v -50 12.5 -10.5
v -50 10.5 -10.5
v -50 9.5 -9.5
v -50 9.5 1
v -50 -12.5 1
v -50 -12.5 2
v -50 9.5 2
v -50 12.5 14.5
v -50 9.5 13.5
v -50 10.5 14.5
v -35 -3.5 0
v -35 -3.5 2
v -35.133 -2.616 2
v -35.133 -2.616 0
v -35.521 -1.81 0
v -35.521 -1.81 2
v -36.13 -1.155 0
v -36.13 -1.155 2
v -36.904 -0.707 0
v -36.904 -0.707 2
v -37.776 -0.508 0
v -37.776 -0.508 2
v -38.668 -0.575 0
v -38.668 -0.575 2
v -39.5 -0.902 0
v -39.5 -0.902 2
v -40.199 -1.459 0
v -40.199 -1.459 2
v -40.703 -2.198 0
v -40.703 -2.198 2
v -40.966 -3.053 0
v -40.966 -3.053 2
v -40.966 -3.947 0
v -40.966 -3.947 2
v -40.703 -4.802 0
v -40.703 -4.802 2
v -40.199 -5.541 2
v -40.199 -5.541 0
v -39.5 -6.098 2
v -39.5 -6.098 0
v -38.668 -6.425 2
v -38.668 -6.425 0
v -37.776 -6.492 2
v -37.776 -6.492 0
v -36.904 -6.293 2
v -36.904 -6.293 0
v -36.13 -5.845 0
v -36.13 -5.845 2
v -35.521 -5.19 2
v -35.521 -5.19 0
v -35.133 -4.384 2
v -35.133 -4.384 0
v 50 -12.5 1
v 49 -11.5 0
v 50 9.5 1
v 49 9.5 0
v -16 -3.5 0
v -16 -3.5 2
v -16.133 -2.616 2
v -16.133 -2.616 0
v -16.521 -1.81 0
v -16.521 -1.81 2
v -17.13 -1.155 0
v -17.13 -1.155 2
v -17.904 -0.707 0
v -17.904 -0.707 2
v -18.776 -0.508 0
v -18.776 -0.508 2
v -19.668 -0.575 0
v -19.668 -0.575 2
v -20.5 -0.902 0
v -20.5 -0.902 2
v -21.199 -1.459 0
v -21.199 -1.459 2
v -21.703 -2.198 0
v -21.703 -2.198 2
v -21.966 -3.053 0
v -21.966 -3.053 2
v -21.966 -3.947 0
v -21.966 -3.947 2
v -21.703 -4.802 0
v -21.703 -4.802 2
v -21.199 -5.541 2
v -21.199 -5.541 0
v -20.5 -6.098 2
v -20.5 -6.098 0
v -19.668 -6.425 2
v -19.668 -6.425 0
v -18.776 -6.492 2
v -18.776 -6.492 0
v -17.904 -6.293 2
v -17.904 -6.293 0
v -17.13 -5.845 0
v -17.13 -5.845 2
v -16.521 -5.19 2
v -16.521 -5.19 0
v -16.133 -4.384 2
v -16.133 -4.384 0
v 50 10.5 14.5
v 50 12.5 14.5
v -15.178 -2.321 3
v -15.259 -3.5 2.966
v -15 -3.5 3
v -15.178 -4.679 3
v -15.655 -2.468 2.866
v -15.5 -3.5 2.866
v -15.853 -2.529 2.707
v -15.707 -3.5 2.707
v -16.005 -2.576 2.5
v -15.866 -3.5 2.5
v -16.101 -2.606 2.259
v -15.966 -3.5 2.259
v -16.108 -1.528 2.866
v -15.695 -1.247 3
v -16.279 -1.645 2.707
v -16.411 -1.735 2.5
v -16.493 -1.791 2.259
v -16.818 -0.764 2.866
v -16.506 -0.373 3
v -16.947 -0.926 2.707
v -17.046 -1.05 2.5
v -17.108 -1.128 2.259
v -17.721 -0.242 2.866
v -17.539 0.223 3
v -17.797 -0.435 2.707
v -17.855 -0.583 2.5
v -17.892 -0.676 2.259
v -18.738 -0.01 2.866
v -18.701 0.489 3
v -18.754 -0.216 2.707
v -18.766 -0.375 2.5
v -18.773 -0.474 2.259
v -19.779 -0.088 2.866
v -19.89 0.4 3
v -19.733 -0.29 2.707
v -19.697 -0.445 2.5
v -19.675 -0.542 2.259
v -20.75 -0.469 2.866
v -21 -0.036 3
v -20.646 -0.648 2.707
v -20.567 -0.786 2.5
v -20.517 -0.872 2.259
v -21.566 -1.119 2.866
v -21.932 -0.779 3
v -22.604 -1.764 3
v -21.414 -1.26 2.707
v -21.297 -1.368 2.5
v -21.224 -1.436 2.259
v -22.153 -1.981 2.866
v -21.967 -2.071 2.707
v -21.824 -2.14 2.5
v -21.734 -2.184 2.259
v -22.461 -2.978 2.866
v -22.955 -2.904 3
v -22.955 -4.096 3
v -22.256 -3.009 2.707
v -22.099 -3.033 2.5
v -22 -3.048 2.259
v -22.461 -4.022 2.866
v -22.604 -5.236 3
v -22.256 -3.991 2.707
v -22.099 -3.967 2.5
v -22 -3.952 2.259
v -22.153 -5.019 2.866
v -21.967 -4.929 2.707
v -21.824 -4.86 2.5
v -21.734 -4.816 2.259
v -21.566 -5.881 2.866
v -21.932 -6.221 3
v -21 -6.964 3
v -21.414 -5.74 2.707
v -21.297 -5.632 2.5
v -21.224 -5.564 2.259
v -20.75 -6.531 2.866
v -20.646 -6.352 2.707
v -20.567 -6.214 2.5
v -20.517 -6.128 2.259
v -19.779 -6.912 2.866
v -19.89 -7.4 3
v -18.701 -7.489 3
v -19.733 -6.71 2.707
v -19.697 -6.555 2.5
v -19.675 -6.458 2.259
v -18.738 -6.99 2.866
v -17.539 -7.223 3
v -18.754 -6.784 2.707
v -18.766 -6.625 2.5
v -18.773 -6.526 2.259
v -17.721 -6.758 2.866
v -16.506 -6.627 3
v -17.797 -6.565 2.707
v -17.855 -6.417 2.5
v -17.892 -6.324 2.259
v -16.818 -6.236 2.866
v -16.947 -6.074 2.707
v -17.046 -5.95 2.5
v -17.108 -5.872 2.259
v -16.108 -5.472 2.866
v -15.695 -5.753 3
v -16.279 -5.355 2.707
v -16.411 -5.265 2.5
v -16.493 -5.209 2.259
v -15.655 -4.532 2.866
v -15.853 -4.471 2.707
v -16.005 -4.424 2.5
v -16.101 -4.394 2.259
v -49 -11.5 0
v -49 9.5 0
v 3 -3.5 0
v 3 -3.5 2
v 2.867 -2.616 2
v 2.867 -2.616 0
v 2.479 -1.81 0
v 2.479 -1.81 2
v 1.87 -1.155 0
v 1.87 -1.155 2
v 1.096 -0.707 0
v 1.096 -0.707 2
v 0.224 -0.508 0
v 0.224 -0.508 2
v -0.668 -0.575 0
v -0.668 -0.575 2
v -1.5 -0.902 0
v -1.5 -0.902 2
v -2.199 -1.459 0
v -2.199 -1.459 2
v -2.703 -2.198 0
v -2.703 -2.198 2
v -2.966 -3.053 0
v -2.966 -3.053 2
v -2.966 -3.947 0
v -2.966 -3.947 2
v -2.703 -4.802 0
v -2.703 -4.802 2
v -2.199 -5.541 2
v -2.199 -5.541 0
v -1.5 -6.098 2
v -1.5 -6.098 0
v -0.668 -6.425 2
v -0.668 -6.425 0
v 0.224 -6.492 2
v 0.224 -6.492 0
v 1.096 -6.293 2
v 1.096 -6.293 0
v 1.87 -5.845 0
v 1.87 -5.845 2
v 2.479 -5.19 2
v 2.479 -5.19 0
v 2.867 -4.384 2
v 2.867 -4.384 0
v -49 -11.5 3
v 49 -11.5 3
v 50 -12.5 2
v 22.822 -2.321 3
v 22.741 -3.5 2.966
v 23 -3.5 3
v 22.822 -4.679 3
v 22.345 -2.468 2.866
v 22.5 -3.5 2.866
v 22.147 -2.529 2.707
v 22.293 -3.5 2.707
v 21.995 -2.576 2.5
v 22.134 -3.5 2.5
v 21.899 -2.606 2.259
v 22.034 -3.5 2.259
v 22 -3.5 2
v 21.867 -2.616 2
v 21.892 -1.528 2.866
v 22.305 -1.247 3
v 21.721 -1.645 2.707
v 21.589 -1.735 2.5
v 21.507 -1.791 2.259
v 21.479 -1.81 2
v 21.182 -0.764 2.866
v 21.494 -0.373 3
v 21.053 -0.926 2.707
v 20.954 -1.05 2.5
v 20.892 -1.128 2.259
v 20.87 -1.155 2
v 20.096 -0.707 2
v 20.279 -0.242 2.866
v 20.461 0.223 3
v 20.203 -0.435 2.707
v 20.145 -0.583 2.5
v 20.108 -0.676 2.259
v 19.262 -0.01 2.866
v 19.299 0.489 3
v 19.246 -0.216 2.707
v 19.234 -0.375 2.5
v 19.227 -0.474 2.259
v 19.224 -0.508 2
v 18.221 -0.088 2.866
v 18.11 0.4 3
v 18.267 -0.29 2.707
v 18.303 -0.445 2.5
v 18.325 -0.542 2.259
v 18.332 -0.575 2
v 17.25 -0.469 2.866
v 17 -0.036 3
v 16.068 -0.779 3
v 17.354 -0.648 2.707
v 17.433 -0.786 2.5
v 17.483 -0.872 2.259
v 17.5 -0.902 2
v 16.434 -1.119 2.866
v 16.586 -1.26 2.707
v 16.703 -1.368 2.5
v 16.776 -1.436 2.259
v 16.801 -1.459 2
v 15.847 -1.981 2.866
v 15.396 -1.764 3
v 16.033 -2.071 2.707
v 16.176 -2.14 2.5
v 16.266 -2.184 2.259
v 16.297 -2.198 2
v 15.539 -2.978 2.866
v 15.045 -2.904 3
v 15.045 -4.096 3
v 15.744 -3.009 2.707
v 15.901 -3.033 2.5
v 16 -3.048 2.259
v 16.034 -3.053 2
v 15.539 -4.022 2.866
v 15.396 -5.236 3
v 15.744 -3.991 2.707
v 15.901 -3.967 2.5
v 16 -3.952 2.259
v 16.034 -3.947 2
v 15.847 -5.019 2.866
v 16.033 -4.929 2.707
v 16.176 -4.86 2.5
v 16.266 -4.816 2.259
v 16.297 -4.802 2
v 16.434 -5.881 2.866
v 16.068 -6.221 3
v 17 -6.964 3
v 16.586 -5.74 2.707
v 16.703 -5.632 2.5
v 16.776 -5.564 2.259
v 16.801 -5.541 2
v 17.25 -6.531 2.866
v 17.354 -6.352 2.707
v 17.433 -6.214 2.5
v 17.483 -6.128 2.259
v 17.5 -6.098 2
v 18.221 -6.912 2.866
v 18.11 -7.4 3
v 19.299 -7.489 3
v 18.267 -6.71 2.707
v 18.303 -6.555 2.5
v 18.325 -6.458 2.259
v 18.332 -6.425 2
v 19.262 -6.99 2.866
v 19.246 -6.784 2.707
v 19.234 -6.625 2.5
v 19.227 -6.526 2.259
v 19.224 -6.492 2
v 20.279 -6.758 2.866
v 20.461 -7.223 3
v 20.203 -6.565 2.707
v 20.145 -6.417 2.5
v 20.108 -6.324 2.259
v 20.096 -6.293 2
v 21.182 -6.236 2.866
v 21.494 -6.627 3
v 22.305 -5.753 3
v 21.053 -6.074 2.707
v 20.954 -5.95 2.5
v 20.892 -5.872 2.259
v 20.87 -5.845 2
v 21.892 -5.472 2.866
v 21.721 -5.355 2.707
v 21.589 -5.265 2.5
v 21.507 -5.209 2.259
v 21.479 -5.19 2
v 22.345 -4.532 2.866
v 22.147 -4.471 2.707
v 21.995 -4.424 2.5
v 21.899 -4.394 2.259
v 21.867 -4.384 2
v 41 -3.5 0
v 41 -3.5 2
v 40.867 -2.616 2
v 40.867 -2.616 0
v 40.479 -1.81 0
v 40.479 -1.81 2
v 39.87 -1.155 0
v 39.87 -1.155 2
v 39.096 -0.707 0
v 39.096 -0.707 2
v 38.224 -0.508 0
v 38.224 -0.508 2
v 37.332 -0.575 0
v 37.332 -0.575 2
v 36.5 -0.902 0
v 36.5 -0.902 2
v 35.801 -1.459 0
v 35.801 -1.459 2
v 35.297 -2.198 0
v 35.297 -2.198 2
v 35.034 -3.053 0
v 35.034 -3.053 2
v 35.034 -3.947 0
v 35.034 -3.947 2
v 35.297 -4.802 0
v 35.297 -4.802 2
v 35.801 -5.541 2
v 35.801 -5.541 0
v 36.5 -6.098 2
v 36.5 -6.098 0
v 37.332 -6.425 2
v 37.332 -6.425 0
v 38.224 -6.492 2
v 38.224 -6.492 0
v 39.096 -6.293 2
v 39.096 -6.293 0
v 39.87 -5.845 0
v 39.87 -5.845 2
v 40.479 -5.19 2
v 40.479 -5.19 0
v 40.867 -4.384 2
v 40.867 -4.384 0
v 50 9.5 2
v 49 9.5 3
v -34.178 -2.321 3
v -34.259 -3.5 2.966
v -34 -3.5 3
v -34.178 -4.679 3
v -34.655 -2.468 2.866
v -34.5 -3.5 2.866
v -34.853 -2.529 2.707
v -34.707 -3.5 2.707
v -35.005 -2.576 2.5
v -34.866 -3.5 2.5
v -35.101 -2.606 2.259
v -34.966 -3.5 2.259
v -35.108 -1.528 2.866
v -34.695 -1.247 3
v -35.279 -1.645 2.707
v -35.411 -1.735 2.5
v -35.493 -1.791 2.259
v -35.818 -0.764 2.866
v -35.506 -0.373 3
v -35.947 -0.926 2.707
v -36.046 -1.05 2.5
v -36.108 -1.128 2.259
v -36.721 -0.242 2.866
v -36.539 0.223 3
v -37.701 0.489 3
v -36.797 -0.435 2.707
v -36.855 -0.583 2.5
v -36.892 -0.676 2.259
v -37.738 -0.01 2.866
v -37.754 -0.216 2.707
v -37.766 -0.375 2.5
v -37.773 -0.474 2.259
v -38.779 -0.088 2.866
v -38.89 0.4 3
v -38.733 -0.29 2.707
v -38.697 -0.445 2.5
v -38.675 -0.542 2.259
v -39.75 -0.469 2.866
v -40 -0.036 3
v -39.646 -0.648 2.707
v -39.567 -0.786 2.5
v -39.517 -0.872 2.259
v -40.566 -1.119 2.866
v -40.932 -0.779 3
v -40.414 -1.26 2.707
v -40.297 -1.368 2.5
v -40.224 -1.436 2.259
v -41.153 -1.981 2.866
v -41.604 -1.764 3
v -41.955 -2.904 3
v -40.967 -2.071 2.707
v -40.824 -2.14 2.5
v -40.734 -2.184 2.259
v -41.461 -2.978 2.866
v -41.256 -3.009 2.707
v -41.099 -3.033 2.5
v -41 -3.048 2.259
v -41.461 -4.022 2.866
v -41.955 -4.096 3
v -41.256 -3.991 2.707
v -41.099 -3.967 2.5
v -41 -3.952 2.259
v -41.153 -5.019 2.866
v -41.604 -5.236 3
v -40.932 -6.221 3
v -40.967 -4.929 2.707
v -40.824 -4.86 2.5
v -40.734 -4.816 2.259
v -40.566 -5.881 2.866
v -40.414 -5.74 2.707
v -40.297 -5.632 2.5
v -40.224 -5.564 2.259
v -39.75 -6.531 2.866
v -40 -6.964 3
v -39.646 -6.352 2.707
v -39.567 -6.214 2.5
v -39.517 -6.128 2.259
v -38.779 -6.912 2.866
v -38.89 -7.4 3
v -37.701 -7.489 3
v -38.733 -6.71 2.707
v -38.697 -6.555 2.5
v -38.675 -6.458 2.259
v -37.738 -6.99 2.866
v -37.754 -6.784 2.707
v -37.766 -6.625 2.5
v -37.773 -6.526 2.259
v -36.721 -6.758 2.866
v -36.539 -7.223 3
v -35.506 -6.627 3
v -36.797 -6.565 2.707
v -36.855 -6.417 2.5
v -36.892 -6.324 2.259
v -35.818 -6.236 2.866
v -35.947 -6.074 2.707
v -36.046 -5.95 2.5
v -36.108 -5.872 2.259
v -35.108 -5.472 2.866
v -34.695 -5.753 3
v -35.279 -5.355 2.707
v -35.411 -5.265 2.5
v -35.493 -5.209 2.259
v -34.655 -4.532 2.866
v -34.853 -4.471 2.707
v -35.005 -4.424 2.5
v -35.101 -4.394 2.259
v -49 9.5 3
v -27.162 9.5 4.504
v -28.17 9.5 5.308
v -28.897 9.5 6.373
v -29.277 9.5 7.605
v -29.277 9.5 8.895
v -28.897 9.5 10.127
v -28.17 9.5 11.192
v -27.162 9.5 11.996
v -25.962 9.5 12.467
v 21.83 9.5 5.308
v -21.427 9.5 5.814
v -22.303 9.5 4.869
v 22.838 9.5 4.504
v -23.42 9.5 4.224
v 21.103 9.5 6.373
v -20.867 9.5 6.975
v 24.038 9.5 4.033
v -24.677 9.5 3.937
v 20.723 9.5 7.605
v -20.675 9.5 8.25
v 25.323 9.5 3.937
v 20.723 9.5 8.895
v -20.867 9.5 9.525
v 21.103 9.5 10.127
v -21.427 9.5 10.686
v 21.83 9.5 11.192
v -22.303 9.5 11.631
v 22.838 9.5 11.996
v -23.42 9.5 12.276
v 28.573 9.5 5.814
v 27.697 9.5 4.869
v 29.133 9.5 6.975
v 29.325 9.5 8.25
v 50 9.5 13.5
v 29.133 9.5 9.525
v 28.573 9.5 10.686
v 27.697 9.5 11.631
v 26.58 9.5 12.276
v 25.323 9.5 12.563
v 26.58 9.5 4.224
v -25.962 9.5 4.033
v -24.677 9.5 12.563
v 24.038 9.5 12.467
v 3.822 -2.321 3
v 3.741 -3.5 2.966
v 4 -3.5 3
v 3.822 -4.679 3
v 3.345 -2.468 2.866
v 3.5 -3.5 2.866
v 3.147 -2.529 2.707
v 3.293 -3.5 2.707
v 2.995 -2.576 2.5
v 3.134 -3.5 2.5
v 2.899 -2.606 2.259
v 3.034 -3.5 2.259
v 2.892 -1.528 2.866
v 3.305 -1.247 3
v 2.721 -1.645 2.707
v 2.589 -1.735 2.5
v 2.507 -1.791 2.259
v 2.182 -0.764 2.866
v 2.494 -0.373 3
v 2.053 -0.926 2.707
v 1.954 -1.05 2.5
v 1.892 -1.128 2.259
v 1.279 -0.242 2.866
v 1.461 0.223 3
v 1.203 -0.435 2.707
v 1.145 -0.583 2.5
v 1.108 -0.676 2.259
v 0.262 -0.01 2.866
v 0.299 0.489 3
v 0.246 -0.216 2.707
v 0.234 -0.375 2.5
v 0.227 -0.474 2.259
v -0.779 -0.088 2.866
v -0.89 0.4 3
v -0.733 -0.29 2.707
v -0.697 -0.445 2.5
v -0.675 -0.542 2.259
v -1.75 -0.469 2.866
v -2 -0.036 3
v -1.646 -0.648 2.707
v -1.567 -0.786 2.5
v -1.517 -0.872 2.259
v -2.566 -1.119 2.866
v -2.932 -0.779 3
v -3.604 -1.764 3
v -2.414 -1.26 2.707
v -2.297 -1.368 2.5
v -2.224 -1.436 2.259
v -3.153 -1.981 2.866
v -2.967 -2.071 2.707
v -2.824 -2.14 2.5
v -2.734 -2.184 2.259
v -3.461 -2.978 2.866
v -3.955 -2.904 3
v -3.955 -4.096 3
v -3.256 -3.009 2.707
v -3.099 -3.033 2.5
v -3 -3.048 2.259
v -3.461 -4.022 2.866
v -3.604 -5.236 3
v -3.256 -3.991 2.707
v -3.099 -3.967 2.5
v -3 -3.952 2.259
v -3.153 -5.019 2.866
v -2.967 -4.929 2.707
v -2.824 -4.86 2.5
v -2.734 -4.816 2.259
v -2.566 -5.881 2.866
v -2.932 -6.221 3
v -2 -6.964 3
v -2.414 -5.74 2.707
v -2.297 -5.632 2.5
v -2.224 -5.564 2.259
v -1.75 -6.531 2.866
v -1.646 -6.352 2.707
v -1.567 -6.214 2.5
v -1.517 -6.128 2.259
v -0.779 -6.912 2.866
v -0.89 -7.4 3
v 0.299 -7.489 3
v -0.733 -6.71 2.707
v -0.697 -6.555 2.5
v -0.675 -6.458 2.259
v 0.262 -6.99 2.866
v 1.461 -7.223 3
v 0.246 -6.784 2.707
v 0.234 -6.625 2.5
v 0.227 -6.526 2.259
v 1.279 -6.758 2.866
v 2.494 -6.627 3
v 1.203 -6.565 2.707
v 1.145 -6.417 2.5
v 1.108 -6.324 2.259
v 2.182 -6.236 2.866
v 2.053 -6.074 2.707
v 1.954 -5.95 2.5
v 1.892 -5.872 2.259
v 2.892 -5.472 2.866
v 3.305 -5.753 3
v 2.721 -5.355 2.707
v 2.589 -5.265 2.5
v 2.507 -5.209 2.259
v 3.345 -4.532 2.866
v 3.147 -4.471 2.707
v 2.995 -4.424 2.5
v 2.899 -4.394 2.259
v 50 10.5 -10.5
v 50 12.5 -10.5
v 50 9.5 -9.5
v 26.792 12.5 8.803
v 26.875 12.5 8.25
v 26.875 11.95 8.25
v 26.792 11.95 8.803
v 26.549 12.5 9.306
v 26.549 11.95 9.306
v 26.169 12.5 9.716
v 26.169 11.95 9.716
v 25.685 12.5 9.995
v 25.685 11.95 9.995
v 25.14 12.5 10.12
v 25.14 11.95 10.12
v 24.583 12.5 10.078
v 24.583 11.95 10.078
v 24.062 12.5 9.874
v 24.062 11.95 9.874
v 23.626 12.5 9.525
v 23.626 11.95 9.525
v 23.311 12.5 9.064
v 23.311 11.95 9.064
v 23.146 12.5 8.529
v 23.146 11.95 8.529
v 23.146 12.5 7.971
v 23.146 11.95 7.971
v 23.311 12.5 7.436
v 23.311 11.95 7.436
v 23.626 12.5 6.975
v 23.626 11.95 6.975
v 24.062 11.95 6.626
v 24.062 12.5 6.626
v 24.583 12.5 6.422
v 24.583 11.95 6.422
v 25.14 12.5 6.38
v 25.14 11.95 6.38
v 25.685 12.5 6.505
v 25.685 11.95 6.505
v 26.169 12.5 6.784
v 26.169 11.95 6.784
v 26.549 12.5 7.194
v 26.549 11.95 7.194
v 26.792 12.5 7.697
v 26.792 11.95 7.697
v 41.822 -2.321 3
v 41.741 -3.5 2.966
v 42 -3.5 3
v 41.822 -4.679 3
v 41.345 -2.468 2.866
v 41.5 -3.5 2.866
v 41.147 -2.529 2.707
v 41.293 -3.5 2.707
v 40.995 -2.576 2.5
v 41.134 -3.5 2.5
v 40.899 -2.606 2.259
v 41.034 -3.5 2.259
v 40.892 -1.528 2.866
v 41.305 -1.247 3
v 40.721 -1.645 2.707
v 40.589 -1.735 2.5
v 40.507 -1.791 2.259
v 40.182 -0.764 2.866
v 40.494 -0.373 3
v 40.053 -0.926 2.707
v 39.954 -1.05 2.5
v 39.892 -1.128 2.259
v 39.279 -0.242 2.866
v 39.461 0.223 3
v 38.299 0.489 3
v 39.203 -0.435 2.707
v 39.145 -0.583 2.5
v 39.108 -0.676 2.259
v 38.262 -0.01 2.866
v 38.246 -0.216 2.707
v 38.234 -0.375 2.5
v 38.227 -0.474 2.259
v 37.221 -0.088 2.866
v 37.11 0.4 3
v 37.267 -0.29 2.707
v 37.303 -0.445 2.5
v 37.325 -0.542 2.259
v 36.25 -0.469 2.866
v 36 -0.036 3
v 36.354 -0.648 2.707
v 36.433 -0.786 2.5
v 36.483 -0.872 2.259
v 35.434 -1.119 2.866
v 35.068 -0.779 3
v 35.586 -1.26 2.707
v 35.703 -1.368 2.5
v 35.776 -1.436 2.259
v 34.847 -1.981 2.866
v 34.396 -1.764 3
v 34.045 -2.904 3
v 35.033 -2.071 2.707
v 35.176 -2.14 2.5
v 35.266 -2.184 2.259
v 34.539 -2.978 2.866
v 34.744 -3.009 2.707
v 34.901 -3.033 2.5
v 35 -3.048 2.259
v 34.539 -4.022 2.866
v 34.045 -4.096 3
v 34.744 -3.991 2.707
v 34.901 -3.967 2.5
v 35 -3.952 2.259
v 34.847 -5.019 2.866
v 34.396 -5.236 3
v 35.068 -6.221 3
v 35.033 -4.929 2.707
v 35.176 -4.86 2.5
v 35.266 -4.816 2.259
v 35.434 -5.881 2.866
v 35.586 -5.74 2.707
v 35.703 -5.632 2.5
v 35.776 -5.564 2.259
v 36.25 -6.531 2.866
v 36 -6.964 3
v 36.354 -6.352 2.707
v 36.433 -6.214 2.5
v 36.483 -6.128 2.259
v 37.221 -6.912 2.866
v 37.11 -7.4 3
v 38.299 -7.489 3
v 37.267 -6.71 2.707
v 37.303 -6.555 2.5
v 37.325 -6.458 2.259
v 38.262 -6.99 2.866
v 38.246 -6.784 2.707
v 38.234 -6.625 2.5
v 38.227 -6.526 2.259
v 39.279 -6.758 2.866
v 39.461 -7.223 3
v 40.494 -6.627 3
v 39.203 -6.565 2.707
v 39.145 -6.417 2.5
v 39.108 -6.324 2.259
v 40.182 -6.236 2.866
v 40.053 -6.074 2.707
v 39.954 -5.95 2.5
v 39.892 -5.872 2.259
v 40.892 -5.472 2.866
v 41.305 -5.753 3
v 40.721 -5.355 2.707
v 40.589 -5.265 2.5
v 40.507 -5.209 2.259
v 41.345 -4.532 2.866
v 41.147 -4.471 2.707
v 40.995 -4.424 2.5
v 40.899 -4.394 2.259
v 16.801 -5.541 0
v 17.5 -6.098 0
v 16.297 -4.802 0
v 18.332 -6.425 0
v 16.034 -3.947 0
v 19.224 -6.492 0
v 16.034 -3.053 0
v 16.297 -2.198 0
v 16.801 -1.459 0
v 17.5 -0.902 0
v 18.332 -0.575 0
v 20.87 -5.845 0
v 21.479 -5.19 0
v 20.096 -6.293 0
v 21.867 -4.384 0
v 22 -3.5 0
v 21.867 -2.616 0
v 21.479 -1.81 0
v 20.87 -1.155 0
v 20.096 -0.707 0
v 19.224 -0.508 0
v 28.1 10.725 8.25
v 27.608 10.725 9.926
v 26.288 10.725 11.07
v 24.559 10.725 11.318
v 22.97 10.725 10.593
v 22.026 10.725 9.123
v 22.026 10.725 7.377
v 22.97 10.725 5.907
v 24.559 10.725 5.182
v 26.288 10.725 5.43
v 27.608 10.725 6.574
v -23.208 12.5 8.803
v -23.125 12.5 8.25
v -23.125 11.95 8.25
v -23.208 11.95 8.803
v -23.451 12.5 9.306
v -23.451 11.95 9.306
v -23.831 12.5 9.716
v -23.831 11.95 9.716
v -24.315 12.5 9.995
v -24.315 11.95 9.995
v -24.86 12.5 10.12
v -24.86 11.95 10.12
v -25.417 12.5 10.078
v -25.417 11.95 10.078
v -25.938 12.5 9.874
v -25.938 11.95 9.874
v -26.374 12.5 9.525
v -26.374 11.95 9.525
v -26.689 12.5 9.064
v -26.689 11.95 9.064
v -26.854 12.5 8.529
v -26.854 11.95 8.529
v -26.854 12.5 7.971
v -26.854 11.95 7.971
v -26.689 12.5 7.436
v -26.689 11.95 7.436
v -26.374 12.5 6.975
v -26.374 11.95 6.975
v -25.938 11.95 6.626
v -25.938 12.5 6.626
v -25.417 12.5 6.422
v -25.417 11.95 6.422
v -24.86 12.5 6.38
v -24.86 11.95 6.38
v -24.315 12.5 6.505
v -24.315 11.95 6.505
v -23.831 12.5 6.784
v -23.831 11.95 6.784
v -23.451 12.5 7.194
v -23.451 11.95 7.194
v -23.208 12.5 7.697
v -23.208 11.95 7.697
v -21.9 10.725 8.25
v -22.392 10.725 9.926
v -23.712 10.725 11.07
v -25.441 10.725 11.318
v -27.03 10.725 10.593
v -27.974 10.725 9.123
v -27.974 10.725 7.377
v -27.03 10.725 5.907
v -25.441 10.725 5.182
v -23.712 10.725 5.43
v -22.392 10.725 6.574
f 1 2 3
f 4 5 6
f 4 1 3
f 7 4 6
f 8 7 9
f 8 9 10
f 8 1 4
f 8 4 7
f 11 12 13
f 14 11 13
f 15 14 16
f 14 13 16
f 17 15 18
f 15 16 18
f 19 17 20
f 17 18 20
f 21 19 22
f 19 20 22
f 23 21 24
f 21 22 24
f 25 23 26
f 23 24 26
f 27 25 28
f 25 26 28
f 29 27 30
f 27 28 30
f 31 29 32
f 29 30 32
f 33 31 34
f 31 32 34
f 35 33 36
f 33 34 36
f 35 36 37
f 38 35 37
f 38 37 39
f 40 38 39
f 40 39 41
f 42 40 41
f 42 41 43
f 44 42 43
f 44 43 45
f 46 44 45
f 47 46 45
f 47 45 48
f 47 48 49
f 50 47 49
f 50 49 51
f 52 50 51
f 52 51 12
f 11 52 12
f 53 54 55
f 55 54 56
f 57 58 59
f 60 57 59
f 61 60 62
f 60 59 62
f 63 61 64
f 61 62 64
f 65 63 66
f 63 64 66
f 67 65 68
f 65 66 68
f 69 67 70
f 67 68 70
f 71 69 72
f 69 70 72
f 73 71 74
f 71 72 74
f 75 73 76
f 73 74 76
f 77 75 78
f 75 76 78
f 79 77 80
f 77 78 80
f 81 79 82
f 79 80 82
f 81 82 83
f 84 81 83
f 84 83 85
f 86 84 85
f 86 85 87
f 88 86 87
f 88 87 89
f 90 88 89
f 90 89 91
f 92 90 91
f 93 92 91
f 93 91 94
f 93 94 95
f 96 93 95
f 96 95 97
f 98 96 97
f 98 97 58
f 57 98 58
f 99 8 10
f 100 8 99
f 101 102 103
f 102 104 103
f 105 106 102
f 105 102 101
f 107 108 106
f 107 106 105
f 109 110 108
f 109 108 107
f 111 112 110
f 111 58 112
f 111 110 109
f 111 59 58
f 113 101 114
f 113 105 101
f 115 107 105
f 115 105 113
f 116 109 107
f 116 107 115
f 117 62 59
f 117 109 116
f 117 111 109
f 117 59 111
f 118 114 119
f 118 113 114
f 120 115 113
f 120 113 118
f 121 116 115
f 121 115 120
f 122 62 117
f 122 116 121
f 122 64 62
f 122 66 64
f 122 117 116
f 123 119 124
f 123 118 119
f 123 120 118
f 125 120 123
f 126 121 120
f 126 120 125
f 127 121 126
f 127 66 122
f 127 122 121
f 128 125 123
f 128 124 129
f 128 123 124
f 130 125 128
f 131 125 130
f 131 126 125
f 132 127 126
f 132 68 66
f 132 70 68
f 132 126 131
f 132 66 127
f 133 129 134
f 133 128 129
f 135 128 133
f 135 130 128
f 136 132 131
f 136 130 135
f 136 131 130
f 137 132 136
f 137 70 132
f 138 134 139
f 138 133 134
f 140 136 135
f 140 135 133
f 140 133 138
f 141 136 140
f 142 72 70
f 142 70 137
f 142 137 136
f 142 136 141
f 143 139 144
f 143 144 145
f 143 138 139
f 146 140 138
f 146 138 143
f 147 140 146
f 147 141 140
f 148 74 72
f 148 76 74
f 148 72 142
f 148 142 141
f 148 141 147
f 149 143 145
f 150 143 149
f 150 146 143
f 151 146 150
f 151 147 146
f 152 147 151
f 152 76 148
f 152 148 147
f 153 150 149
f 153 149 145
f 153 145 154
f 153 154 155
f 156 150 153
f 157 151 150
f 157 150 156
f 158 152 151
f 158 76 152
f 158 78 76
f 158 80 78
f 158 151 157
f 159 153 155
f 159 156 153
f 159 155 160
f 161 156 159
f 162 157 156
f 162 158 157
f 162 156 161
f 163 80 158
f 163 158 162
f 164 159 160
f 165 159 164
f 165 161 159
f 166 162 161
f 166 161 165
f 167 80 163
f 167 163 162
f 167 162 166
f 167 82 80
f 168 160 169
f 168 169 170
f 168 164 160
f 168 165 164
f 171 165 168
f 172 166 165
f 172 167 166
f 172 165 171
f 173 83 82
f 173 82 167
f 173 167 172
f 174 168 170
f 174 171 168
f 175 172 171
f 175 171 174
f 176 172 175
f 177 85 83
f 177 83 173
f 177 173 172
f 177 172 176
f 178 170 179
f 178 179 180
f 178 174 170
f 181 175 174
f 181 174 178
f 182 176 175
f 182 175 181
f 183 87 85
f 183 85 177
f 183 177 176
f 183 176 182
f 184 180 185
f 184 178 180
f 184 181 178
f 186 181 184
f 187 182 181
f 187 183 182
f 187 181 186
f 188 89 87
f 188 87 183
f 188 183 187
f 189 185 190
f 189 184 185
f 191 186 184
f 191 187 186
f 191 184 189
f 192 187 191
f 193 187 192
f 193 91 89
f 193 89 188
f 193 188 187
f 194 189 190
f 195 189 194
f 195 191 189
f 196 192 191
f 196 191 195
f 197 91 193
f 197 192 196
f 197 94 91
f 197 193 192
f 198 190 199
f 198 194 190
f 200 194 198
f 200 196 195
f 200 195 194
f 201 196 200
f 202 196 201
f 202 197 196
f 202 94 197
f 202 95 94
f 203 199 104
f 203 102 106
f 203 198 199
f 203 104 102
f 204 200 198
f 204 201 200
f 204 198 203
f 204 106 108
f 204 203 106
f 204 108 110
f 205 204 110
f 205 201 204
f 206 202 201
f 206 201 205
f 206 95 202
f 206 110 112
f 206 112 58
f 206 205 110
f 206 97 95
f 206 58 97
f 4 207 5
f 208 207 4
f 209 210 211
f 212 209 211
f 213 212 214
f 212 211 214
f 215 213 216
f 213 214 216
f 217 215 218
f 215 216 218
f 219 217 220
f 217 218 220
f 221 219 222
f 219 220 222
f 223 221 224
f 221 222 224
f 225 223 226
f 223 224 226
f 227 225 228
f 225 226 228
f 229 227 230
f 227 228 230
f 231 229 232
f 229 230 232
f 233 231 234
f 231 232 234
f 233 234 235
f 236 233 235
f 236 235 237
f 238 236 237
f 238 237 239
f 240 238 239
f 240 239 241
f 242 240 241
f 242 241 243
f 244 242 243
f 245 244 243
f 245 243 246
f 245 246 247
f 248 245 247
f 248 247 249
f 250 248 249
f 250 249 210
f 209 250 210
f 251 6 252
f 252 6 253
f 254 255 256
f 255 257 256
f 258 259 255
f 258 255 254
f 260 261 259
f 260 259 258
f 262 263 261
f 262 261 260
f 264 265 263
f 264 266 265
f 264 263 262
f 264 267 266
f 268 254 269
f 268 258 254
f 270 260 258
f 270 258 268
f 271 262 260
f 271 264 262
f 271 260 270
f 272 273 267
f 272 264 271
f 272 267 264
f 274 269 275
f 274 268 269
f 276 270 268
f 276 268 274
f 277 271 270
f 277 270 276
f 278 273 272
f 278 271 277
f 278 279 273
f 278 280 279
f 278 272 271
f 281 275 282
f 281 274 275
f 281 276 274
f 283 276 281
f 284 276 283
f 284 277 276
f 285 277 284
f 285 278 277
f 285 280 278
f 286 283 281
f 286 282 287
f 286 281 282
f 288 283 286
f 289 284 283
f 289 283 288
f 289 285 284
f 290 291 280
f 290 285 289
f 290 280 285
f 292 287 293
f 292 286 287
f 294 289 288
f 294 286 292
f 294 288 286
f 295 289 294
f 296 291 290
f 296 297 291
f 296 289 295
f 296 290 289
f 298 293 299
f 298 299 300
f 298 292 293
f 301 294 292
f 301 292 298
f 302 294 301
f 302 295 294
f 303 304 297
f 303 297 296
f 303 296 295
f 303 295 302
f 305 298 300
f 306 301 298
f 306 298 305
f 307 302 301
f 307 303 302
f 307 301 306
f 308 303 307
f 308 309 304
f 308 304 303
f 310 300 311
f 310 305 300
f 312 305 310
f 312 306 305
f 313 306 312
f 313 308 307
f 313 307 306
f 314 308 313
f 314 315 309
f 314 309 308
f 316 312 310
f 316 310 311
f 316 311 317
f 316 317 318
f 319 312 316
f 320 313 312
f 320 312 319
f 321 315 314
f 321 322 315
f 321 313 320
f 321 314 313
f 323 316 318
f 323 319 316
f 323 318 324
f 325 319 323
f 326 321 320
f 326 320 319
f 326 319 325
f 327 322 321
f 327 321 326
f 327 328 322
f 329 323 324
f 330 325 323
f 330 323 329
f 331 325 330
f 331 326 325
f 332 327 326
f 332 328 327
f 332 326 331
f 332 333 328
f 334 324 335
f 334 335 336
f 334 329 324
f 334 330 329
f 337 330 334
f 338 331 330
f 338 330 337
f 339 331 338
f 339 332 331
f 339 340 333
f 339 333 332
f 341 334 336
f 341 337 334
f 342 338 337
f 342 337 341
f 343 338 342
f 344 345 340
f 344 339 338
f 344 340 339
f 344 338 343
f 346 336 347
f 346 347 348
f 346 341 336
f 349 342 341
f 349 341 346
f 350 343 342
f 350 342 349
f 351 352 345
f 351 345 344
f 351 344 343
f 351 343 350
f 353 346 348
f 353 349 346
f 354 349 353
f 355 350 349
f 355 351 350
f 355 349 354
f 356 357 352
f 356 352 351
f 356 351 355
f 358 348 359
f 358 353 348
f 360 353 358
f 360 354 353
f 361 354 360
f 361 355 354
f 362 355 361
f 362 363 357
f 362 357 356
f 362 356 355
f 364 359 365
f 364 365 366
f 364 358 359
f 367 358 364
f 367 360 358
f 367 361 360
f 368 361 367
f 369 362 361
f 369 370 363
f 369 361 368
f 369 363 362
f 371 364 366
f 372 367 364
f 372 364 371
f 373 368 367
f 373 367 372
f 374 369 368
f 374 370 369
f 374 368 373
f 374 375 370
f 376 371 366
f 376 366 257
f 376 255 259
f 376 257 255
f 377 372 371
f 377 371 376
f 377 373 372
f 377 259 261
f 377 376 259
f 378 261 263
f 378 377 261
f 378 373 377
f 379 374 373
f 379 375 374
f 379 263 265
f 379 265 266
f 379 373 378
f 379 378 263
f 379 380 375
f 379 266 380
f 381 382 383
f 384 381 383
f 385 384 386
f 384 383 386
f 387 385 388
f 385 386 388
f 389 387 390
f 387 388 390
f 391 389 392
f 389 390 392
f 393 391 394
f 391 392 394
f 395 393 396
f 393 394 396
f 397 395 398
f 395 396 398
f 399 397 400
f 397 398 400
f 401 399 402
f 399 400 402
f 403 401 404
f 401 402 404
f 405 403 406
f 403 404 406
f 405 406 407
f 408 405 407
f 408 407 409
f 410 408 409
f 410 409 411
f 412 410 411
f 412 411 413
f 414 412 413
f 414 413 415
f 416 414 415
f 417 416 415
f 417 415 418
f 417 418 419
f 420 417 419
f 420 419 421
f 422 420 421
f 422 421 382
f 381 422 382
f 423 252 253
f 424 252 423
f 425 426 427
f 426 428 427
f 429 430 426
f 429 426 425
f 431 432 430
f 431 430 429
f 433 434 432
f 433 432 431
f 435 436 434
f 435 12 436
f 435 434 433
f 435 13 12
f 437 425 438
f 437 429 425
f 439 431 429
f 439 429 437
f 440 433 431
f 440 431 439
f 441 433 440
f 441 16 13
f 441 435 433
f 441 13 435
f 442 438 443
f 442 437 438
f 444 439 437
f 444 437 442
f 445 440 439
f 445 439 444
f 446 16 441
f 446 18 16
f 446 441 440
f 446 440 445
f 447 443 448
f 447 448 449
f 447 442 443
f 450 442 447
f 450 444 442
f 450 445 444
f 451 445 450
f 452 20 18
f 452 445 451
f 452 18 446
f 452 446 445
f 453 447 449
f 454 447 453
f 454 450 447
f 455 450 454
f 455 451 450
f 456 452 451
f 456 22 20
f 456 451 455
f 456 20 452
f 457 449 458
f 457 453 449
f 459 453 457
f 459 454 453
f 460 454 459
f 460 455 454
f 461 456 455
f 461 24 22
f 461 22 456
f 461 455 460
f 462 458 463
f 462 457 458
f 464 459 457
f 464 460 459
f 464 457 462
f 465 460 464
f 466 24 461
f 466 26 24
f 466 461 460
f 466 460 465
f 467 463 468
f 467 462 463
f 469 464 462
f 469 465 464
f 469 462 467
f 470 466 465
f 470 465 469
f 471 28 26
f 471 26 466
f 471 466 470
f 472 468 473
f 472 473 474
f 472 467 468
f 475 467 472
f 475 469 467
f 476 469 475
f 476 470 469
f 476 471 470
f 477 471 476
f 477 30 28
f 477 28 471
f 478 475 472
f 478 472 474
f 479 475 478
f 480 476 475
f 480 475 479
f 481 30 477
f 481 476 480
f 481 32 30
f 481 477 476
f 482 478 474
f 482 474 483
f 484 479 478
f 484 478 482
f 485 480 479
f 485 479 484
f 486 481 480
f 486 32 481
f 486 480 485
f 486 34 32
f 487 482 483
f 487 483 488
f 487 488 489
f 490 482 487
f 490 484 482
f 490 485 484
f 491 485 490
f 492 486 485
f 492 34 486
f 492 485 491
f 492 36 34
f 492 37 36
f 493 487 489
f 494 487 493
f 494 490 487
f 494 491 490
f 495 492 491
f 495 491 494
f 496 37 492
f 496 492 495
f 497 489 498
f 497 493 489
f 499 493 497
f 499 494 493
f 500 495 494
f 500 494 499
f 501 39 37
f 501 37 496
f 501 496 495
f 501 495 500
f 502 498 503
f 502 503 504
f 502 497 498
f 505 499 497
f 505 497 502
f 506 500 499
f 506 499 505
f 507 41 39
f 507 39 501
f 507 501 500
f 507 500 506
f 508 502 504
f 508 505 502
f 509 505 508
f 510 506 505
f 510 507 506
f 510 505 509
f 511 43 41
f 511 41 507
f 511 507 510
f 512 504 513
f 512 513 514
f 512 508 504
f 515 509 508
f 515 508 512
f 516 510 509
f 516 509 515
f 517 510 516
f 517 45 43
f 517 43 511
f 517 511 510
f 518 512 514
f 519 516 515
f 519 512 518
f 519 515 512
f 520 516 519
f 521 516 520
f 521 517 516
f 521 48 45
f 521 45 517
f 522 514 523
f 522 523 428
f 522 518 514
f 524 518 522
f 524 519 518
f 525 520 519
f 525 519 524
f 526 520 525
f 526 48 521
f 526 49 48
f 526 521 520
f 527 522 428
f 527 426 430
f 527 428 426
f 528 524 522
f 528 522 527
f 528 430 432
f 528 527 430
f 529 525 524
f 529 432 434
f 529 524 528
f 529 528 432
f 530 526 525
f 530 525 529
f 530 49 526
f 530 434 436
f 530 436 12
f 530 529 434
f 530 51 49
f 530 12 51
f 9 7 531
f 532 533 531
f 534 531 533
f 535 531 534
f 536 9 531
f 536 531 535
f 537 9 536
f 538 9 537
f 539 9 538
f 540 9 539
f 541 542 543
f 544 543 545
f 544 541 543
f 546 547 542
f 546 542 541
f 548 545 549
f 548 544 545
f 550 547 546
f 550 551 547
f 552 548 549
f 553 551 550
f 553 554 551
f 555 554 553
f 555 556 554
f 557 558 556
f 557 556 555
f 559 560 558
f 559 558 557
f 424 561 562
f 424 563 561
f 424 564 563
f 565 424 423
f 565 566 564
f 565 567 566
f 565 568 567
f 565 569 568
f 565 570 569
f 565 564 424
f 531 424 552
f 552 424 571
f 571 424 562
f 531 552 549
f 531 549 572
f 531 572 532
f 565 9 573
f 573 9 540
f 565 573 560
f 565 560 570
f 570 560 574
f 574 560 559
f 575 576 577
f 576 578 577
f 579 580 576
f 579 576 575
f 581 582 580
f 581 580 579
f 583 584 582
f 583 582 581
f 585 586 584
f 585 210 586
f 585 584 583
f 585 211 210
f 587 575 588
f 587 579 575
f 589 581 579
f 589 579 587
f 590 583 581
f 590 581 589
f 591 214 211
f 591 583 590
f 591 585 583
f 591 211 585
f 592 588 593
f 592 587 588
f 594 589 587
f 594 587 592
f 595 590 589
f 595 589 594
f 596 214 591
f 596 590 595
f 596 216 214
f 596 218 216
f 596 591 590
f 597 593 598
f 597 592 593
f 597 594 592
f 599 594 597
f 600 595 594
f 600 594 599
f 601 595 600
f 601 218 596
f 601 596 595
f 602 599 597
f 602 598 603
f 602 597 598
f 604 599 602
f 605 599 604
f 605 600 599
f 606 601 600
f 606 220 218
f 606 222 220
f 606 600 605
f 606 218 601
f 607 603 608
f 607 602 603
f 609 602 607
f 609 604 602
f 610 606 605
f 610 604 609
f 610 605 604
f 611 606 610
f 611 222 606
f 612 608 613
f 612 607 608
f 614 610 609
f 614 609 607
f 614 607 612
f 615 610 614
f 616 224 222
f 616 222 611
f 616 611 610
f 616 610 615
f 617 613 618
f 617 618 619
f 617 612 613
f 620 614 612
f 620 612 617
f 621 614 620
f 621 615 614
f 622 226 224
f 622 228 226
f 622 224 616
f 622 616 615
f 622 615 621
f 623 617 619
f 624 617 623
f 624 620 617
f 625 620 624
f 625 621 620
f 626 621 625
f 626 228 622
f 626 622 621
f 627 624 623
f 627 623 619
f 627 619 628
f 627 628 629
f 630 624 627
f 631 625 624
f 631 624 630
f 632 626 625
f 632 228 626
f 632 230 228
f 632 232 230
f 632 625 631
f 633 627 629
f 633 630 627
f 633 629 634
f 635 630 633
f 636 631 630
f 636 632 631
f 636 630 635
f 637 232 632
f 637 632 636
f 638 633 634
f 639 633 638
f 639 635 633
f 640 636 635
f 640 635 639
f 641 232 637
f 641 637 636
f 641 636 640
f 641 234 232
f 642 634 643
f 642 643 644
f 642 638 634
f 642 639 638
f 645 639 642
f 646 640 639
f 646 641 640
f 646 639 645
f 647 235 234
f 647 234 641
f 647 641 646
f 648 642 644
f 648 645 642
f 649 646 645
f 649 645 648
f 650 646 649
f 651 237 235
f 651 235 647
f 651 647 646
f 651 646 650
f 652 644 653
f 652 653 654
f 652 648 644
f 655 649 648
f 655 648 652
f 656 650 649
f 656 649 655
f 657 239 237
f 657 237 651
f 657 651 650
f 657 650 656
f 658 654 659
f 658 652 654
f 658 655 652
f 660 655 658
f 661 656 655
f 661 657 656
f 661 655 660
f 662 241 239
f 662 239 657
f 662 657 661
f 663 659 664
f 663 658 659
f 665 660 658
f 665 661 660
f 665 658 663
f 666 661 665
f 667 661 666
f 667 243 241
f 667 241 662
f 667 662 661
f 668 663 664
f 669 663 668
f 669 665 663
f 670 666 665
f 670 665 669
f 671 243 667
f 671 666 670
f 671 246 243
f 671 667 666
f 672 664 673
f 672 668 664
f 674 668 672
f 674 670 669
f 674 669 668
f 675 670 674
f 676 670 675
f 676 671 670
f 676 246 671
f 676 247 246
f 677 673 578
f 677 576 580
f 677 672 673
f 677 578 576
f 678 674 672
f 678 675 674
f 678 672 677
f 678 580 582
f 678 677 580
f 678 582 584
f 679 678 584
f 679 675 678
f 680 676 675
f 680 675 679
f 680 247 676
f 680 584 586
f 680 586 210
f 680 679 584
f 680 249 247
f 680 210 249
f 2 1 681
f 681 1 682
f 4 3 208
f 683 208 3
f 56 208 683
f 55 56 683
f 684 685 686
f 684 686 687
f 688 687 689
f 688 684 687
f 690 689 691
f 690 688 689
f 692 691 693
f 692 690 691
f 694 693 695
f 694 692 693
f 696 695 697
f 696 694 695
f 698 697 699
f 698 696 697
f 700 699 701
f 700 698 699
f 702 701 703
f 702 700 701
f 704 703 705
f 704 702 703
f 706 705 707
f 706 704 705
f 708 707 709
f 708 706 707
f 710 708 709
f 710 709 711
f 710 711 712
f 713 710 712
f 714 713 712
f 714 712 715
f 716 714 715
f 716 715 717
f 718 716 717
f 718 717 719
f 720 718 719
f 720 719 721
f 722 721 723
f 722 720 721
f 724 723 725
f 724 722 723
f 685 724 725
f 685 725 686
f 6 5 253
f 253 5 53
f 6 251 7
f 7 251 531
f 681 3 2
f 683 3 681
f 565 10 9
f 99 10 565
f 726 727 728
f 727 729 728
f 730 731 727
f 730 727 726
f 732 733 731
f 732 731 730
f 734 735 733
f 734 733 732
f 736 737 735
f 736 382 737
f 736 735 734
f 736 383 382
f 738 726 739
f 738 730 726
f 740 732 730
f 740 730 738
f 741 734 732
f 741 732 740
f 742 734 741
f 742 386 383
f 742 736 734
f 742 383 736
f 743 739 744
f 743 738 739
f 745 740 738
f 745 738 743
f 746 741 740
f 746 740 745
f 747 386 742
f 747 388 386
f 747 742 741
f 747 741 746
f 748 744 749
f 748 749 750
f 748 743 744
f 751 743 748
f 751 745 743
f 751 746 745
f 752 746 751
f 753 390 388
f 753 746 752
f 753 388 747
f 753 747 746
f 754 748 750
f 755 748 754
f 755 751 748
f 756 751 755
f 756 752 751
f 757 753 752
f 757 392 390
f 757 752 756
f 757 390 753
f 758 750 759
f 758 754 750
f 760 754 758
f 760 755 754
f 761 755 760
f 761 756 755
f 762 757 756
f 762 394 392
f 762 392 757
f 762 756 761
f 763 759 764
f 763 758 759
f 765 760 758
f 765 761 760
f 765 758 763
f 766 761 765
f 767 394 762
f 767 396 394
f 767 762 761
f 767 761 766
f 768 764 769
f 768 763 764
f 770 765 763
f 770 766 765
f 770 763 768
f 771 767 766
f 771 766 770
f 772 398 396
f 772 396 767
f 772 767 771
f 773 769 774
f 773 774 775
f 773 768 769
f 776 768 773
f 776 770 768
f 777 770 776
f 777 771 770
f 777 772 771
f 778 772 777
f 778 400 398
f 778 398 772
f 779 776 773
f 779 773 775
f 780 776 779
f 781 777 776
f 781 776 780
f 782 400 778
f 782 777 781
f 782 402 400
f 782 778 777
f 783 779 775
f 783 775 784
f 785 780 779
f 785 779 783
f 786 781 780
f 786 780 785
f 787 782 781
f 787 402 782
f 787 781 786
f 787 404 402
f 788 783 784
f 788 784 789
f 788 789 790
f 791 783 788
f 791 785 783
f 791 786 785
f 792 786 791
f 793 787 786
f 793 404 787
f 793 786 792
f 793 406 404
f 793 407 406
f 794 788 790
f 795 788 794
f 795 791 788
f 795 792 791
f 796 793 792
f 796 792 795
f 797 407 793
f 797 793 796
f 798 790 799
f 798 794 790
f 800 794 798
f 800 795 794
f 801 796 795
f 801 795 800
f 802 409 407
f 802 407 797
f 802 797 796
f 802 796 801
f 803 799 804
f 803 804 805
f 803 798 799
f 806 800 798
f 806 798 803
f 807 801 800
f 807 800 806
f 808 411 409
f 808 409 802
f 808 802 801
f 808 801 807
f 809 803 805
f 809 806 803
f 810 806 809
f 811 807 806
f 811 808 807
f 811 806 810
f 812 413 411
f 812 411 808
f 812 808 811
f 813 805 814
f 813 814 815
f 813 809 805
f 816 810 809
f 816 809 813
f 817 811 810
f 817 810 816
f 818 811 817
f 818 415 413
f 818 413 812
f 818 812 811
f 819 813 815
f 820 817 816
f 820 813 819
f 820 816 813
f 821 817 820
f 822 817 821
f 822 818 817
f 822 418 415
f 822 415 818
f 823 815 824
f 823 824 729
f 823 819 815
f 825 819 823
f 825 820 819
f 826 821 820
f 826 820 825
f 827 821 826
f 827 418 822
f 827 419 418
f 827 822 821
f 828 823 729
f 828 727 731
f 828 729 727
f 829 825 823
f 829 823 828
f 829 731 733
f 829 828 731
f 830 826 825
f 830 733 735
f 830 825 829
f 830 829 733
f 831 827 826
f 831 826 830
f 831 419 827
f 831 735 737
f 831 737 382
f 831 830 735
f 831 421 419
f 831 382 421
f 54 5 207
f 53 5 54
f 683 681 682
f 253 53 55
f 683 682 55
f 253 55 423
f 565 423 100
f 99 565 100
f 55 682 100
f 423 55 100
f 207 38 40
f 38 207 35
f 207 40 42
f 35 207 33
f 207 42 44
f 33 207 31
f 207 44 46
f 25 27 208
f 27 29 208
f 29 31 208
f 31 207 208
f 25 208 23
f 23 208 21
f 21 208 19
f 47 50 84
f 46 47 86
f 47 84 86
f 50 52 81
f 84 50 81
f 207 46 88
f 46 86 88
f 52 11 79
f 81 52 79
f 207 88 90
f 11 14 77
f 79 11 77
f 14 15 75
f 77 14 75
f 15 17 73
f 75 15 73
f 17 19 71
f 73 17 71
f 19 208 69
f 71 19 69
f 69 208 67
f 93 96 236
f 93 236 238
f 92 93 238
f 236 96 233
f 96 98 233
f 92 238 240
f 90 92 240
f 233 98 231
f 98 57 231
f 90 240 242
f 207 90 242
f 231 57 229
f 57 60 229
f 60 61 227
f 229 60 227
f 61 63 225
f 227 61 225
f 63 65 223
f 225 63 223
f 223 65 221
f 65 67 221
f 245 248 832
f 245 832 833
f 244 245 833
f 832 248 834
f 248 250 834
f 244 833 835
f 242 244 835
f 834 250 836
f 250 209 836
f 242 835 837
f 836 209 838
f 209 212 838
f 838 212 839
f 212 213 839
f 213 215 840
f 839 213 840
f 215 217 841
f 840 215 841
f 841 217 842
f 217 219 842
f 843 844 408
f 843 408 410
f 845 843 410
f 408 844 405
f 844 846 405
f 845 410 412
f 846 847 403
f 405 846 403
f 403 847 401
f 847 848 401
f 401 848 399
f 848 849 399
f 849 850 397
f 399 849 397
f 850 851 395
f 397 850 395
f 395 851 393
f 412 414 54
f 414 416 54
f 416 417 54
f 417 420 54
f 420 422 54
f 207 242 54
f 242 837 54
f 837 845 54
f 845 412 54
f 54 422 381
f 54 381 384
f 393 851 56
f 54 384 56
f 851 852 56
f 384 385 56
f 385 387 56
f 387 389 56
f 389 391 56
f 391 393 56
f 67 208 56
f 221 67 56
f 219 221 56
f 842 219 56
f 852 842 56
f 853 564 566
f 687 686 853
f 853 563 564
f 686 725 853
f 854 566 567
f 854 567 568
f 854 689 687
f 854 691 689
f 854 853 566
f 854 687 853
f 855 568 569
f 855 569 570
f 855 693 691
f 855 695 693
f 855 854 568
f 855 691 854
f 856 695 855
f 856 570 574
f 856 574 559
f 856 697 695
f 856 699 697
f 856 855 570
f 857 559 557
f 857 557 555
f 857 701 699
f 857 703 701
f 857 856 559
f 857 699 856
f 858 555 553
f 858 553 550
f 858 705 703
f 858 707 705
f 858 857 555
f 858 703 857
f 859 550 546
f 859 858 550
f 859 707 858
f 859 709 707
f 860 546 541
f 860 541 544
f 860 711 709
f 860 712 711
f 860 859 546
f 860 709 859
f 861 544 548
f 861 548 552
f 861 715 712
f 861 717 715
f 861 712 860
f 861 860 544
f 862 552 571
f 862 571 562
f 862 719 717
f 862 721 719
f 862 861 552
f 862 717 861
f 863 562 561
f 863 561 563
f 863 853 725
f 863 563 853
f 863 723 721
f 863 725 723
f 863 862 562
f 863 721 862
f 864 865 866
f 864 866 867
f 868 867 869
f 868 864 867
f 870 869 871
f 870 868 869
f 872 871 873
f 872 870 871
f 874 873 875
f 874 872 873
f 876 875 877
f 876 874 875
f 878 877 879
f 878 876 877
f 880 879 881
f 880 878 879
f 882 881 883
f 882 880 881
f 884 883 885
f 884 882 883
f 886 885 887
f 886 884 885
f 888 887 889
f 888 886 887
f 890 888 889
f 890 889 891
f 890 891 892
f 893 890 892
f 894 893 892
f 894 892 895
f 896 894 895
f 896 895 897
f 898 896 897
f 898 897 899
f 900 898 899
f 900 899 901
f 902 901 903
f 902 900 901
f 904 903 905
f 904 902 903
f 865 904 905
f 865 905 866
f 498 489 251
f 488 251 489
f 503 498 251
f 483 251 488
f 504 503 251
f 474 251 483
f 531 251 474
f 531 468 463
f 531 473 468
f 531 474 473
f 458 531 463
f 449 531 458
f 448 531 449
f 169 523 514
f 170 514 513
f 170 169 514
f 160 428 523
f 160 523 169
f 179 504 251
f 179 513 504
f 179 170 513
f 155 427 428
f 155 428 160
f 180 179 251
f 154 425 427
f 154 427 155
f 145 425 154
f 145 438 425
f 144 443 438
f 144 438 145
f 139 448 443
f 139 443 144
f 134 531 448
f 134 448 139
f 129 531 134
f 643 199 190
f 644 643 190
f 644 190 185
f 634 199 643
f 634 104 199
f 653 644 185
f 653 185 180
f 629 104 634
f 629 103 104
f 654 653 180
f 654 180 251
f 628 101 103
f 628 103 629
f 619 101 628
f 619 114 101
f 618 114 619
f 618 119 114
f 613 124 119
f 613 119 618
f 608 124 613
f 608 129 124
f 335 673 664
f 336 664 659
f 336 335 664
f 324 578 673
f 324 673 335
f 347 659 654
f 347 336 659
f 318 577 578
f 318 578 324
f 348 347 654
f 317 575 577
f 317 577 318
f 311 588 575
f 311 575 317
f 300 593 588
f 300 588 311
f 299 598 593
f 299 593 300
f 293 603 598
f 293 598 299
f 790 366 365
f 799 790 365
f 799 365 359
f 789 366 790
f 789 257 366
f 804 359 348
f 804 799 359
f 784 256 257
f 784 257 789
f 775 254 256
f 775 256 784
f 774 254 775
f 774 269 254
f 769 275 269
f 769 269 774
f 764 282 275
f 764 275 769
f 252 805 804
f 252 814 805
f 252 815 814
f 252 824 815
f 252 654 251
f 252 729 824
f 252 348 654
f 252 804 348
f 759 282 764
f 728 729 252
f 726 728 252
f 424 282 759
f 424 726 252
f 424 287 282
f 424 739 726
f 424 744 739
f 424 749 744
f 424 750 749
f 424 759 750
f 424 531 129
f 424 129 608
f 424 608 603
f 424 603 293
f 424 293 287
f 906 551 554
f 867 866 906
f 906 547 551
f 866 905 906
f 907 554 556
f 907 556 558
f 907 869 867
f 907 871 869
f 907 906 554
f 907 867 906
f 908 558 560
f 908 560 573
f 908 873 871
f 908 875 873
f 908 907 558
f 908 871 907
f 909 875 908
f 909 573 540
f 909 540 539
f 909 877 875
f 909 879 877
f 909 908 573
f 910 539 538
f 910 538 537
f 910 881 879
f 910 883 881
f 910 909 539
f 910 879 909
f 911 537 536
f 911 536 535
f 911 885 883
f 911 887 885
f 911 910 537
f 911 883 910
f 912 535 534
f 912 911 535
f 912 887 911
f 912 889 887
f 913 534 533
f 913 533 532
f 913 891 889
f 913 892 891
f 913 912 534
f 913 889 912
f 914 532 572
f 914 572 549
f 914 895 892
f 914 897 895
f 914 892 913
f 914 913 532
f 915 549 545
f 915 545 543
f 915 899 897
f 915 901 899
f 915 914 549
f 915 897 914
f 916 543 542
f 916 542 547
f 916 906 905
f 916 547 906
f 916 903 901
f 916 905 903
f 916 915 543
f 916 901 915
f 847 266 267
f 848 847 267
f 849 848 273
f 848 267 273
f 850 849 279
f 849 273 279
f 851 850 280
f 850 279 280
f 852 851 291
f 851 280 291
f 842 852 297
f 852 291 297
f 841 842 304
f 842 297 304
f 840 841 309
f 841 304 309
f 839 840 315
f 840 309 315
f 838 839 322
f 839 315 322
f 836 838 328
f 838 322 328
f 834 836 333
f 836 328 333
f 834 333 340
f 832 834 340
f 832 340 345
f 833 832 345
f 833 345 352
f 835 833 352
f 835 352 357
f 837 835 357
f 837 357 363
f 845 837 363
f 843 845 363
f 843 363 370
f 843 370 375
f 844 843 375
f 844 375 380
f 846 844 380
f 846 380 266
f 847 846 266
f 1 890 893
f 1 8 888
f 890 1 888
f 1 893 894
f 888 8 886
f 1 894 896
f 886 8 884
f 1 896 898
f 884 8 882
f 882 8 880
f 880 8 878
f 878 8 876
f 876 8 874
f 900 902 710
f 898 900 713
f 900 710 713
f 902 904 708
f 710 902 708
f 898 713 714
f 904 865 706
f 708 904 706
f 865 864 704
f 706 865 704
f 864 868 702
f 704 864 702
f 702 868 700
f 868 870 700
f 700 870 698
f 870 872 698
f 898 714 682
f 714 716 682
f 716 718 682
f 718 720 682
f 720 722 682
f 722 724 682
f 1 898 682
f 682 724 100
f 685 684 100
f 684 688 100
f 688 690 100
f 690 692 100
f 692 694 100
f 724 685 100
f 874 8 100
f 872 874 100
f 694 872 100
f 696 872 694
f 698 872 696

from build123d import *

# Parameters (mm, degrees)
SKETCH_W               = 100
SKETCH_H               = 25
PAD_DEPTH              = 3
SKETCH001_W            = 100
SKETCH001_H            = 25
SKETCH001_R            = 1.875
PAD001_DEPTH           = 3
SKETCH002_R            = 3
POCKET_DEPTH           = 13.501
LINEARPATTERN_COUNT    = 3
LINEARPATTERN_PITCH    = 19
LINEARPATTERN001_COUNT = 3
LINEARPATTERN001_PITCH = 19
FILLET_R               = 1
CHAMFER_SIZE           = 2.45
CHAMFER001_SIZE        = 1


with BuildPart() as part:
    # Sketch → Pad (new body)
    with BuildSketch(Plane.XY):
        Rectangle(SKETCH_W, SKETCH_H)
    extrude(amount=PAD_DEPTH)

    # Sketch001 → Pad001 (join)
    with BuildSketch(Plane(origin=(0, 12.5, 2), x_dir=(1, 0, 0), z_dir=(0, -1, 0))):
        Rectangle(SKETCH001_W, SKETCH001_H)
        with Locations((-25, 6.25)):
            Circle(SKETCH001_R, mode=Mode.SUBTRACT)
        with Locations((25, 6.25)):
            Circle(SKETCH001_R, mode=Mode.SUBTRACT)
    extrude(amount=PAD001_DEPTH)

    # Sketch002 → Pocket (cut, through all)
    with BuildSketch(Plane.XY.offset(3)):
        with Locations((0, -3.5)):
            Circle(SKETCH002_R)
    pocket = extrude(amount=-POCKET_DEPTH, mode=Mode.SUBTRACT)

    # LinearPattern: Pocket ×3
    with Locations(*[(i * LINEARPATTERN_PITCH, 0, 0) for i in range(1, LINEARPATTERN_COUNT)]):
        add(pocket, mode=Mode.SUBTRACT)

    # LinearPattern001: Pocket ×3
    with Locations(*[(-i * LINEARPATTERN001_PITCH, 0, 0) for i in range(1, LINEARPATTERN001_COUNT)]):
        add(pocket, mode=Mode.SUBTRACT)

    # Fillet
    fillet_edges = [part.edges().sort_by_distance(p)[0] for p in [
        (-3, -3.5, 3),
        (-41, -3.5, 3),
        (-22, -3.5, 3),
        (16, -3.5, 3),
        (35, -3.5, 3),
    ]]
    fillet(fillet_edges, radius=FILLET_R)

    # Chamfer
    chamfer_edges = [part.edges().sort_by_distance(p)[0] for p in [
        (-26.875, 9.5, 8.25),
        (23.125, 9.5, 8.25),
    ]]
    chamfer(chamfer_edges, length=CHAMFER_SIZE)

    # Chamfer001
    chamfer001_edges = [part.edges().sort_by_distance(p)[0] for p in [
        (0, 9.5, 14.5),
        (0, -12.5, 3),
        (0, -12.5, 0),
        (-50, -1.5, 3),
        (50, -1.5, 3),
        (50, -1.5, 0),
        (-50, -1.5, 0),
        (0, 9.5, -10.5),
    ]]
    chamfer(chamfer001_edges, length=CHAMFER001_SIZE)


solid = part.part
